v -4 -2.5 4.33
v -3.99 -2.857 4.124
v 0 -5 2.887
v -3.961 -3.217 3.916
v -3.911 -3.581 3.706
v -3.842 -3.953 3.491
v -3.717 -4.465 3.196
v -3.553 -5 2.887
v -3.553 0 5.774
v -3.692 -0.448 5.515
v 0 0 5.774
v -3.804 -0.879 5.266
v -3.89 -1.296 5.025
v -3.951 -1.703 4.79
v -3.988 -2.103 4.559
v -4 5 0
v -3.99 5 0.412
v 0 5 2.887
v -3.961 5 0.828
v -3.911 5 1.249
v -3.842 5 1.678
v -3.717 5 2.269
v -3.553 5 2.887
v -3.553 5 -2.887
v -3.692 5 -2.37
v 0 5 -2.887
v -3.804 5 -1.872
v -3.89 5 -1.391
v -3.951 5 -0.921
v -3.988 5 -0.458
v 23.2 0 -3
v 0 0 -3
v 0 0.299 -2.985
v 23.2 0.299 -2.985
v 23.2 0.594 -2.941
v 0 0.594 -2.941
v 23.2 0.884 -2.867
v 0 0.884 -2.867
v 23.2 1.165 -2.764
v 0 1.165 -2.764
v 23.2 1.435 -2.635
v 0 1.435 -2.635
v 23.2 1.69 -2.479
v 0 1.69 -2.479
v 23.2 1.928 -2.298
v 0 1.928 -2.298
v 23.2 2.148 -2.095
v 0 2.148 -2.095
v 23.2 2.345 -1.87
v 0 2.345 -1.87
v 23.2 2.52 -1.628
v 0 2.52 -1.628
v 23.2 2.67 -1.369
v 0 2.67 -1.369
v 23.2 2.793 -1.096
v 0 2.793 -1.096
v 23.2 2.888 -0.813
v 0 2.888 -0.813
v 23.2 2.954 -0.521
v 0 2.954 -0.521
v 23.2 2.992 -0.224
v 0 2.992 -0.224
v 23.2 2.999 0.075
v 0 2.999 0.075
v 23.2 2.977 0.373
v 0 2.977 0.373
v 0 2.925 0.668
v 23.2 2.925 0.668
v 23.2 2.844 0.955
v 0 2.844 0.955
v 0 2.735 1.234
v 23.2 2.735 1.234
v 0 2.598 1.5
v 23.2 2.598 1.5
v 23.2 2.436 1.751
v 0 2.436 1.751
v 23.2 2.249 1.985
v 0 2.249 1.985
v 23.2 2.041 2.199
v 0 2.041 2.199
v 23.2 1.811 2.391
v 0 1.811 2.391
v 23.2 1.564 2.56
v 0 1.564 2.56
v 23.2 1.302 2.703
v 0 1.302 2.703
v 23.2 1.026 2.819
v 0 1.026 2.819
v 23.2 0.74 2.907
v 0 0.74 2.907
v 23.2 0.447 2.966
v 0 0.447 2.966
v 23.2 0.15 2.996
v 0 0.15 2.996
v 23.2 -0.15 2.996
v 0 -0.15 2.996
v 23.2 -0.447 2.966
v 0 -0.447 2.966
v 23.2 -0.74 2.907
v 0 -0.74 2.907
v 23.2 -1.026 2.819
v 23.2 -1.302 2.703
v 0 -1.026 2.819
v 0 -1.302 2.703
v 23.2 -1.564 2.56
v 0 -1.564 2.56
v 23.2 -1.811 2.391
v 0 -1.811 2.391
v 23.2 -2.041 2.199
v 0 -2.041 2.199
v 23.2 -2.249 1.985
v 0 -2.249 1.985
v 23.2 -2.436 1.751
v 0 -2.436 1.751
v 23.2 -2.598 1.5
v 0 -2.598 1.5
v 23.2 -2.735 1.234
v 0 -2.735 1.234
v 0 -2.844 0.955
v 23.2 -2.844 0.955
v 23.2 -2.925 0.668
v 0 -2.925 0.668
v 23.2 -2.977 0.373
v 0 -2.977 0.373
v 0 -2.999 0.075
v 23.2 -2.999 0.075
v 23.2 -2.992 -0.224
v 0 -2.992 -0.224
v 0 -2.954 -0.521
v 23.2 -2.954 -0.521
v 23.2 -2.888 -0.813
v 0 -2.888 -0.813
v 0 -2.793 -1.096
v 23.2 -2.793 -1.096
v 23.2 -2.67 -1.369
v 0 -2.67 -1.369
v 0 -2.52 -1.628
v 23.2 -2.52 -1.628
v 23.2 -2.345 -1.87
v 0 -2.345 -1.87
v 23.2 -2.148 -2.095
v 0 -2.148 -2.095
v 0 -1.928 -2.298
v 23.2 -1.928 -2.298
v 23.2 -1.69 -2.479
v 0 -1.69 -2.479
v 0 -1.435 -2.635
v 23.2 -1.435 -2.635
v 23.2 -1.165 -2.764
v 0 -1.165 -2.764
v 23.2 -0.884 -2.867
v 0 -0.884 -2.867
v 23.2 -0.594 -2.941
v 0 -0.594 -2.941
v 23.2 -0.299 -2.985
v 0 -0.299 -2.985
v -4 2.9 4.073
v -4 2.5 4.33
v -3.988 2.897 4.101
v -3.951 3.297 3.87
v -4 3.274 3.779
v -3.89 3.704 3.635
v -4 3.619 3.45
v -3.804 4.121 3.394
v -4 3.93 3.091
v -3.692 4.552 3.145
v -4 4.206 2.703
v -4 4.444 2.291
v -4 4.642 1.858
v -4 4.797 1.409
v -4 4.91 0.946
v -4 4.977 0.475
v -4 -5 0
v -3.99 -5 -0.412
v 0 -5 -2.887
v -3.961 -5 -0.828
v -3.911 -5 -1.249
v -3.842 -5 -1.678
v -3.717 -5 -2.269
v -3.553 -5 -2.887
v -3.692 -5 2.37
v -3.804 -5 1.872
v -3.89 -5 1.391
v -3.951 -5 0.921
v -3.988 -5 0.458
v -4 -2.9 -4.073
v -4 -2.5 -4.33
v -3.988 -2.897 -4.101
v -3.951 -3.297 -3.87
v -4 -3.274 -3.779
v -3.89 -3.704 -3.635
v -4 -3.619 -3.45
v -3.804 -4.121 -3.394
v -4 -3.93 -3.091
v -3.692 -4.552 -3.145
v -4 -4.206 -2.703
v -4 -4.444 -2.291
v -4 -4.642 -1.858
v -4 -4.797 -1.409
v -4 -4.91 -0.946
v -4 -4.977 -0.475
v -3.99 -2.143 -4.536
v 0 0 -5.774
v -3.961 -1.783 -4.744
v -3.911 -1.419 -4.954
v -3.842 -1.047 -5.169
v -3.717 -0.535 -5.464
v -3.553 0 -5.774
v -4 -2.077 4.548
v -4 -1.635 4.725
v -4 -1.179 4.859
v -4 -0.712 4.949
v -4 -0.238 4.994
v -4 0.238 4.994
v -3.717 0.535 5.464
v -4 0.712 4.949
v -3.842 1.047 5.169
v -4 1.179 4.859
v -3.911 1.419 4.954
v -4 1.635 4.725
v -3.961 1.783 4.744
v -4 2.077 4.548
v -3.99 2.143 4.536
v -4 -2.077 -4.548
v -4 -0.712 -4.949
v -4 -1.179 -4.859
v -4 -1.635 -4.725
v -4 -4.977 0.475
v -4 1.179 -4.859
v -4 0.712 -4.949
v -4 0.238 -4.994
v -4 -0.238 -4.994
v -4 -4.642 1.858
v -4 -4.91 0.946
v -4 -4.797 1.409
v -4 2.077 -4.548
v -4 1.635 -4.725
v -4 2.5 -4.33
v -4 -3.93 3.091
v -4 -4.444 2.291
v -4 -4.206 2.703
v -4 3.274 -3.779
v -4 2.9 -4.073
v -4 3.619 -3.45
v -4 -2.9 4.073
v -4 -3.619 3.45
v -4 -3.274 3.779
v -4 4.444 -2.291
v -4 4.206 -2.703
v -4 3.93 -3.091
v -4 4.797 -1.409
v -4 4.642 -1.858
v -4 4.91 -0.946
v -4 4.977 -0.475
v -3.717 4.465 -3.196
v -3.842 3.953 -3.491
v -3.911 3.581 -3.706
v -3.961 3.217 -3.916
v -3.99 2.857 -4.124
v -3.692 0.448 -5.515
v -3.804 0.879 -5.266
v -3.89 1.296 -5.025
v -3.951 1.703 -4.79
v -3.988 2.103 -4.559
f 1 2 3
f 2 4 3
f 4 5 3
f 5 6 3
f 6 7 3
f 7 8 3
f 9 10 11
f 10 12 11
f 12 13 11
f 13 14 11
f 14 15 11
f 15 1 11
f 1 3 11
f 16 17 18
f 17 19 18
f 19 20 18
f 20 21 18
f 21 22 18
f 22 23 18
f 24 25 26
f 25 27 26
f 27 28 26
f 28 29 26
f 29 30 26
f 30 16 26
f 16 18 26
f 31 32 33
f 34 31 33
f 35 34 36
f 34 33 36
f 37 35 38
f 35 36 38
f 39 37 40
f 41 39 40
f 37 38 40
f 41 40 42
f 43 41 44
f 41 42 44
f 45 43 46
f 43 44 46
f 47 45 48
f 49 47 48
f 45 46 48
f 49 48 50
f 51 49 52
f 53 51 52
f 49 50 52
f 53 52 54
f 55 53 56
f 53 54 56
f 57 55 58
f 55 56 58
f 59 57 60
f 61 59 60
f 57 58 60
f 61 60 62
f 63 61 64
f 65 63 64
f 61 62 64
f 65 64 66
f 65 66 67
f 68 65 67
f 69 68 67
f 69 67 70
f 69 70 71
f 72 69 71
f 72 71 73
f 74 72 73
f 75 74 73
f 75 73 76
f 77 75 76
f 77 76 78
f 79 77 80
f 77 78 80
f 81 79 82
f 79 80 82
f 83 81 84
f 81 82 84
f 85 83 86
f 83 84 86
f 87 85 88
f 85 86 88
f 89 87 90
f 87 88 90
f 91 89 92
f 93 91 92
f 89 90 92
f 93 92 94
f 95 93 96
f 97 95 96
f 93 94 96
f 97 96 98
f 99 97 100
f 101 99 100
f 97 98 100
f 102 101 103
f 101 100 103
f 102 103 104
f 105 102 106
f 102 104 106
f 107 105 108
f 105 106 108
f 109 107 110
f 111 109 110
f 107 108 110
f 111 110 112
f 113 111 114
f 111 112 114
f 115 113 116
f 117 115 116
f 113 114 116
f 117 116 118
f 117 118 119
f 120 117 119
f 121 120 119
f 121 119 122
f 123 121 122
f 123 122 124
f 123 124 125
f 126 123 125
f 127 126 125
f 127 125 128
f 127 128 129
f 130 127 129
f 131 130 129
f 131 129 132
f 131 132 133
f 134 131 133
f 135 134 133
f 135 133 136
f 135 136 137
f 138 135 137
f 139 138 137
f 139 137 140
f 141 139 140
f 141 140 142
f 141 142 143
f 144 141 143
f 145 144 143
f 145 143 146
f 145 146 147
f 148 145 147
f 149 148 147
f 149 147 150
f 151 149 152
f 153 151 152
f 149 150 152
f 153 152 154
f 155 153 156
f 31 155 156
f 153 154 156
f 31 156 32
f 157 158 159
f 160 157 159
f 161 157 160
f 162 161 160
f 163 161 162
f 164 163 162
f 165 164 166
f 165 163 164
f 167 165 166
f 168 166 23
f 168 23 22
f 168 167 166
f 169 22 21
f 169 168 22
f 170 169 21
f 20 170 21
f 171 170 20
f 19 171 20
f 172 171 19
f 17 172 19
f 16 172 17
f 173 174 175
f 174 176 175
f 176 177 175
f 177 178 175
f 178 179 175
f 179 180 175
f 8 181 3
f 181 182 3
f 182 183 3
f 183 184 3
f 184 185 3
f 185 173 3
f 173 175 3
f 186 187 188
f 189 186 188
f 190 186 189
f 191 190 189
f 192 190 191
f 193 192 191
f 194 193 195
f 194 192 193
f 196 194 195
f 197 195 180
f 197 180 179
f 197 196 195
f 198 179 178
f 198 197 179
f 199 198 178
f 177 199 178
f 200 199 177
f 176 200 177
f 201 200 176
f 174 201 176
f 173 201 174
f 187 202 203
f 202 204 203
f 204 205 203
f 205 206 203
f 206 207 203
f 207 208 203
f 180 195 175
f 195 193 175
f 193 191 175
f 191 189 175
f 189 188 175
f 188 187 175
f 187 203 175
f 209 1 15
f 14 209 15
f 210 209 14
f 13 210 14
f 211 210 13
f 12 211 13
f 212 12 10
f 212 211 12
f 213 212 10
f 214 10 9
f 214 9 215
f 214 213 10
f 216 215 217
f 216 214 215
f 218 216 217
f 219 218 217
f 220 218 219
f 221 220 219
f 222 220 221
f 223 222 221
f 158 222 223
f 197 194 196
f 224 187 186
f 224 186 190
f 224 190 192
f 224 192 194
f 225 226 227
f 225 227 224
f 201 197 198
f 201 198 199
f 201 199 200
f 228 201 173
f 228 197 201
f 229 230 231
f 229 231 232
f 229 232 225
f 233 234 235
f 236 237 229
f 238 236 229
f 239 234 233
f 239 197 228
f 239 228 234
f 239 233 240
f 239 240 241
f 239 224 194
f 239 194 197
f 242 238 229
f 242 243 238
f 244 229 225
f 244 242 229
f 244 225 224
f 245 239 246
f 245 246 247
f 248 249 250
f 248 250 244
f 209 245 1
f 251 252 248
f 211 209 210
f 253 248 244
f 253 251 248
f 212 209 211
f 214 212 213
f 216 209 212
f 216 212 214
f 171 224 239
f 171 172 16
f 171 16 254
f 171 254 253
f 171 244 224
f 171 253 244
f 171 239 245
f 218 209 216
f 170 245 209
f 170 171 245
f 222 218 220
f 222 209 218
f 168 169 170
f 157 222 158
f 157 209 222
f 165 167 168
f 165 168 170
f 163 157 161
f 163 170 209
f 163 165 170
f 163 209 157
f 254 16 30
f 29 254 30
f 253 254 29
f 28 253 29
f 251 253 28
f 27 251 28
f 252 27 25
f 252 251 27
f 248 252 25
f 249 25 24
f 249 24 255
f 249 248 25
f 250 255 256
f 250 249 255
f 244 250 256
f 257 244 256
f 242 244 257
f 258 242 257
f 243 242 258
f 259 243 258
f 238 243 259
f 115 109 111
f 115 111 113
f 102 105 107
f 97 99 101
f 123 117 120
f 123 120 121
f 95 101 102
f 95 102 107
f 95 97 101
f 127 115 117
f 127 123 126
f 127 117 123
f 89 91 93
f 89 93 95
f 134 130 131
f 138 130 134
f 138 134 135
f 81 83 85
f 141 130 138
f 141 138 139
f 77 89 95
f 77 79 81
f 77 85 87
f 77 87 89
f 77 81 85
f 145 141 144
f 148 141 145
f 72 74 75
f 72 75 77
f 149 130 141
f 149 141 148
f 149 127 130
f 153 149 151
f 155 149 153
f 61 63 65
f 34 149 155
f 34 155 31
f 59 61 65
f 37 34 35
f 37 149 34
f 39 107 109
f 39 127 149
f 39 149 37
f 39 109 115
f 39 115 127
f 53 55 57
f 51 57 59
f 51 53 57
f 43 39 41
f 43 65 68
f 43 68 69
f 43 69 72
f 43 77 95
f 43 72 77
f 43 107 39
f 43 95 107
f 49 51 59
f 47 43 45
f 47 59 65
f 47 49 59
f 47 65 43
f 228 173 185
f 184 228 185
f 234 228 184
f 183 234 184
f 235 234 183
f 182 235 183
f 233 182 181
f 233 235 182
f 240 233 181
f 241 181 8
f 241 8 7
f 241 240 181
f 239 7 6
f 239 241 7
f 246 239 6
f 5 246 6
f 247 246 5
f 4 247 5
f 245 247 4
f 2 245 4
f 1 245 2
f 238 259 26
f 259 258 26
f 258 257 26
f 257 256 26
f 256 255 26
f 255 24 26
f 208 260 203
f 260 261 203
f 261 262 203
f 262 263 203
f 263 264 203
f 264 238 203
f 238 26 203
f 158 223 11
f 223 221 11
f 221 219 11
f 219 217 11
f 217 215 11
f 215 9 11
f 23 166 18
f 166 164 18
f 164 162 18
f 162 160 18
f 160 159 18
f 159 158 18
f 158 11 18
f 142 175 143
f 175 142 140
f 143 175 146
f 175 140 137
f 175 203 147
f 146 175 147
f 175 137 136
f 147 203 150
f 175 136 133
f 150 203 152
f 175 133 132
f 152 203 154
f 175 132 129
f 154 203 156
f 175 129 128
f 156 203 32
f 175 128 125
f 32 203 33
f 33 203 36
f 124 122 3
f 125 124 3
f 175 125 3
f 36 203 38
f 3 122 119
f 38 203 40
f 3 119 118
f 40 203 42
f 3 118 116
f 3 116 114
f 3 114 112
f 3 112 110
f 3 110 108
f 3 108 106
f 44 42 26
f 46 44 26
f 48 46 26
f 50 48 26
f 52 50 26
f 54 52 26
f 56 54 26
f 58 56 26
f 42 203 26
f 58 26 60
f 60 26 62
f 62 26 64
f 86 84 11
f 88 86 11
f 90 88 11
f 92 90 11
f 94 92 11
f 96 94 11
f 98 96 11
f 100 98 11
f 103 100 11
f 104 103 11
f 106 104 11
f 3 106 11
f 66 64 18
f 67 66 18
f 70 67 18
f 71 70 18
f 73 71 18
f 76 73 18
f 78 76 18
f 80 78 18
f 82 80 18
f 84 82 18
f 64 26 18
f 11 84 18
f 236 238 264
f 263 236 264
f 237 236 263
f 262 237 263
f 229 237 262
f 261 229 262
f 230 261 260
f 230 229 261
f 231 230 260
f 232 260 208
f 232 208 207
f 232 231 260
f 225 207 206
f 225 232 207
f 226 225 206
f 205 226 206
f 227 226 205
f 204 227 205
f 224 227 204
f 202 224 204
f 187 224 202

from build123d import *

# Parameters (mm, degrees)
SKETCH2_R           = 3
BOSS_EXTRUDE1_DEPTH = 23.2
BOSS_EXTRUDE2_DEPTH = 4


with BuildPart() as part:
    # Sketch2 → Boss-Extrude1 (new body)
    with BuildSketch(Plane(origin=(0, 0, 0), x_dir=(0, 0, -1), z_dir=(1, 0, 0))):
        Circle(SKETCH2_R)
    extrude(amount=BOSS_EXTRUDE1_DEPTH)

    # Sketch3 → Boss-Extrude2 (add)
    with BuildSketch(Plane.ZY):
        Polygon((5.773502692, 0), (2.886751346, 5), (-2.886751346, 5), (-5.773502692, 0), (-2.886751346, -5), (2.886751346, -5), align=None)
    extrude(amount=BOSS_EXTRUDE2_DEPTH)

    # Sketch5 → Cut-Revolve1 (revolve, cut)
    with BuildSketch(Plane(origin=(0, 0, 0), x_dir=(1, 0, 0), z_dir=(0, 1, 0))):
        Polygon((-4, 5), (-4, 5.773502692), (-3.553418013, 5.773502692), align=None)
    revolve(axis=Axis((23.2, 0, 0), (-1, 0, 0)), mode=Mode.SUBTRACT)


solid = part.part
